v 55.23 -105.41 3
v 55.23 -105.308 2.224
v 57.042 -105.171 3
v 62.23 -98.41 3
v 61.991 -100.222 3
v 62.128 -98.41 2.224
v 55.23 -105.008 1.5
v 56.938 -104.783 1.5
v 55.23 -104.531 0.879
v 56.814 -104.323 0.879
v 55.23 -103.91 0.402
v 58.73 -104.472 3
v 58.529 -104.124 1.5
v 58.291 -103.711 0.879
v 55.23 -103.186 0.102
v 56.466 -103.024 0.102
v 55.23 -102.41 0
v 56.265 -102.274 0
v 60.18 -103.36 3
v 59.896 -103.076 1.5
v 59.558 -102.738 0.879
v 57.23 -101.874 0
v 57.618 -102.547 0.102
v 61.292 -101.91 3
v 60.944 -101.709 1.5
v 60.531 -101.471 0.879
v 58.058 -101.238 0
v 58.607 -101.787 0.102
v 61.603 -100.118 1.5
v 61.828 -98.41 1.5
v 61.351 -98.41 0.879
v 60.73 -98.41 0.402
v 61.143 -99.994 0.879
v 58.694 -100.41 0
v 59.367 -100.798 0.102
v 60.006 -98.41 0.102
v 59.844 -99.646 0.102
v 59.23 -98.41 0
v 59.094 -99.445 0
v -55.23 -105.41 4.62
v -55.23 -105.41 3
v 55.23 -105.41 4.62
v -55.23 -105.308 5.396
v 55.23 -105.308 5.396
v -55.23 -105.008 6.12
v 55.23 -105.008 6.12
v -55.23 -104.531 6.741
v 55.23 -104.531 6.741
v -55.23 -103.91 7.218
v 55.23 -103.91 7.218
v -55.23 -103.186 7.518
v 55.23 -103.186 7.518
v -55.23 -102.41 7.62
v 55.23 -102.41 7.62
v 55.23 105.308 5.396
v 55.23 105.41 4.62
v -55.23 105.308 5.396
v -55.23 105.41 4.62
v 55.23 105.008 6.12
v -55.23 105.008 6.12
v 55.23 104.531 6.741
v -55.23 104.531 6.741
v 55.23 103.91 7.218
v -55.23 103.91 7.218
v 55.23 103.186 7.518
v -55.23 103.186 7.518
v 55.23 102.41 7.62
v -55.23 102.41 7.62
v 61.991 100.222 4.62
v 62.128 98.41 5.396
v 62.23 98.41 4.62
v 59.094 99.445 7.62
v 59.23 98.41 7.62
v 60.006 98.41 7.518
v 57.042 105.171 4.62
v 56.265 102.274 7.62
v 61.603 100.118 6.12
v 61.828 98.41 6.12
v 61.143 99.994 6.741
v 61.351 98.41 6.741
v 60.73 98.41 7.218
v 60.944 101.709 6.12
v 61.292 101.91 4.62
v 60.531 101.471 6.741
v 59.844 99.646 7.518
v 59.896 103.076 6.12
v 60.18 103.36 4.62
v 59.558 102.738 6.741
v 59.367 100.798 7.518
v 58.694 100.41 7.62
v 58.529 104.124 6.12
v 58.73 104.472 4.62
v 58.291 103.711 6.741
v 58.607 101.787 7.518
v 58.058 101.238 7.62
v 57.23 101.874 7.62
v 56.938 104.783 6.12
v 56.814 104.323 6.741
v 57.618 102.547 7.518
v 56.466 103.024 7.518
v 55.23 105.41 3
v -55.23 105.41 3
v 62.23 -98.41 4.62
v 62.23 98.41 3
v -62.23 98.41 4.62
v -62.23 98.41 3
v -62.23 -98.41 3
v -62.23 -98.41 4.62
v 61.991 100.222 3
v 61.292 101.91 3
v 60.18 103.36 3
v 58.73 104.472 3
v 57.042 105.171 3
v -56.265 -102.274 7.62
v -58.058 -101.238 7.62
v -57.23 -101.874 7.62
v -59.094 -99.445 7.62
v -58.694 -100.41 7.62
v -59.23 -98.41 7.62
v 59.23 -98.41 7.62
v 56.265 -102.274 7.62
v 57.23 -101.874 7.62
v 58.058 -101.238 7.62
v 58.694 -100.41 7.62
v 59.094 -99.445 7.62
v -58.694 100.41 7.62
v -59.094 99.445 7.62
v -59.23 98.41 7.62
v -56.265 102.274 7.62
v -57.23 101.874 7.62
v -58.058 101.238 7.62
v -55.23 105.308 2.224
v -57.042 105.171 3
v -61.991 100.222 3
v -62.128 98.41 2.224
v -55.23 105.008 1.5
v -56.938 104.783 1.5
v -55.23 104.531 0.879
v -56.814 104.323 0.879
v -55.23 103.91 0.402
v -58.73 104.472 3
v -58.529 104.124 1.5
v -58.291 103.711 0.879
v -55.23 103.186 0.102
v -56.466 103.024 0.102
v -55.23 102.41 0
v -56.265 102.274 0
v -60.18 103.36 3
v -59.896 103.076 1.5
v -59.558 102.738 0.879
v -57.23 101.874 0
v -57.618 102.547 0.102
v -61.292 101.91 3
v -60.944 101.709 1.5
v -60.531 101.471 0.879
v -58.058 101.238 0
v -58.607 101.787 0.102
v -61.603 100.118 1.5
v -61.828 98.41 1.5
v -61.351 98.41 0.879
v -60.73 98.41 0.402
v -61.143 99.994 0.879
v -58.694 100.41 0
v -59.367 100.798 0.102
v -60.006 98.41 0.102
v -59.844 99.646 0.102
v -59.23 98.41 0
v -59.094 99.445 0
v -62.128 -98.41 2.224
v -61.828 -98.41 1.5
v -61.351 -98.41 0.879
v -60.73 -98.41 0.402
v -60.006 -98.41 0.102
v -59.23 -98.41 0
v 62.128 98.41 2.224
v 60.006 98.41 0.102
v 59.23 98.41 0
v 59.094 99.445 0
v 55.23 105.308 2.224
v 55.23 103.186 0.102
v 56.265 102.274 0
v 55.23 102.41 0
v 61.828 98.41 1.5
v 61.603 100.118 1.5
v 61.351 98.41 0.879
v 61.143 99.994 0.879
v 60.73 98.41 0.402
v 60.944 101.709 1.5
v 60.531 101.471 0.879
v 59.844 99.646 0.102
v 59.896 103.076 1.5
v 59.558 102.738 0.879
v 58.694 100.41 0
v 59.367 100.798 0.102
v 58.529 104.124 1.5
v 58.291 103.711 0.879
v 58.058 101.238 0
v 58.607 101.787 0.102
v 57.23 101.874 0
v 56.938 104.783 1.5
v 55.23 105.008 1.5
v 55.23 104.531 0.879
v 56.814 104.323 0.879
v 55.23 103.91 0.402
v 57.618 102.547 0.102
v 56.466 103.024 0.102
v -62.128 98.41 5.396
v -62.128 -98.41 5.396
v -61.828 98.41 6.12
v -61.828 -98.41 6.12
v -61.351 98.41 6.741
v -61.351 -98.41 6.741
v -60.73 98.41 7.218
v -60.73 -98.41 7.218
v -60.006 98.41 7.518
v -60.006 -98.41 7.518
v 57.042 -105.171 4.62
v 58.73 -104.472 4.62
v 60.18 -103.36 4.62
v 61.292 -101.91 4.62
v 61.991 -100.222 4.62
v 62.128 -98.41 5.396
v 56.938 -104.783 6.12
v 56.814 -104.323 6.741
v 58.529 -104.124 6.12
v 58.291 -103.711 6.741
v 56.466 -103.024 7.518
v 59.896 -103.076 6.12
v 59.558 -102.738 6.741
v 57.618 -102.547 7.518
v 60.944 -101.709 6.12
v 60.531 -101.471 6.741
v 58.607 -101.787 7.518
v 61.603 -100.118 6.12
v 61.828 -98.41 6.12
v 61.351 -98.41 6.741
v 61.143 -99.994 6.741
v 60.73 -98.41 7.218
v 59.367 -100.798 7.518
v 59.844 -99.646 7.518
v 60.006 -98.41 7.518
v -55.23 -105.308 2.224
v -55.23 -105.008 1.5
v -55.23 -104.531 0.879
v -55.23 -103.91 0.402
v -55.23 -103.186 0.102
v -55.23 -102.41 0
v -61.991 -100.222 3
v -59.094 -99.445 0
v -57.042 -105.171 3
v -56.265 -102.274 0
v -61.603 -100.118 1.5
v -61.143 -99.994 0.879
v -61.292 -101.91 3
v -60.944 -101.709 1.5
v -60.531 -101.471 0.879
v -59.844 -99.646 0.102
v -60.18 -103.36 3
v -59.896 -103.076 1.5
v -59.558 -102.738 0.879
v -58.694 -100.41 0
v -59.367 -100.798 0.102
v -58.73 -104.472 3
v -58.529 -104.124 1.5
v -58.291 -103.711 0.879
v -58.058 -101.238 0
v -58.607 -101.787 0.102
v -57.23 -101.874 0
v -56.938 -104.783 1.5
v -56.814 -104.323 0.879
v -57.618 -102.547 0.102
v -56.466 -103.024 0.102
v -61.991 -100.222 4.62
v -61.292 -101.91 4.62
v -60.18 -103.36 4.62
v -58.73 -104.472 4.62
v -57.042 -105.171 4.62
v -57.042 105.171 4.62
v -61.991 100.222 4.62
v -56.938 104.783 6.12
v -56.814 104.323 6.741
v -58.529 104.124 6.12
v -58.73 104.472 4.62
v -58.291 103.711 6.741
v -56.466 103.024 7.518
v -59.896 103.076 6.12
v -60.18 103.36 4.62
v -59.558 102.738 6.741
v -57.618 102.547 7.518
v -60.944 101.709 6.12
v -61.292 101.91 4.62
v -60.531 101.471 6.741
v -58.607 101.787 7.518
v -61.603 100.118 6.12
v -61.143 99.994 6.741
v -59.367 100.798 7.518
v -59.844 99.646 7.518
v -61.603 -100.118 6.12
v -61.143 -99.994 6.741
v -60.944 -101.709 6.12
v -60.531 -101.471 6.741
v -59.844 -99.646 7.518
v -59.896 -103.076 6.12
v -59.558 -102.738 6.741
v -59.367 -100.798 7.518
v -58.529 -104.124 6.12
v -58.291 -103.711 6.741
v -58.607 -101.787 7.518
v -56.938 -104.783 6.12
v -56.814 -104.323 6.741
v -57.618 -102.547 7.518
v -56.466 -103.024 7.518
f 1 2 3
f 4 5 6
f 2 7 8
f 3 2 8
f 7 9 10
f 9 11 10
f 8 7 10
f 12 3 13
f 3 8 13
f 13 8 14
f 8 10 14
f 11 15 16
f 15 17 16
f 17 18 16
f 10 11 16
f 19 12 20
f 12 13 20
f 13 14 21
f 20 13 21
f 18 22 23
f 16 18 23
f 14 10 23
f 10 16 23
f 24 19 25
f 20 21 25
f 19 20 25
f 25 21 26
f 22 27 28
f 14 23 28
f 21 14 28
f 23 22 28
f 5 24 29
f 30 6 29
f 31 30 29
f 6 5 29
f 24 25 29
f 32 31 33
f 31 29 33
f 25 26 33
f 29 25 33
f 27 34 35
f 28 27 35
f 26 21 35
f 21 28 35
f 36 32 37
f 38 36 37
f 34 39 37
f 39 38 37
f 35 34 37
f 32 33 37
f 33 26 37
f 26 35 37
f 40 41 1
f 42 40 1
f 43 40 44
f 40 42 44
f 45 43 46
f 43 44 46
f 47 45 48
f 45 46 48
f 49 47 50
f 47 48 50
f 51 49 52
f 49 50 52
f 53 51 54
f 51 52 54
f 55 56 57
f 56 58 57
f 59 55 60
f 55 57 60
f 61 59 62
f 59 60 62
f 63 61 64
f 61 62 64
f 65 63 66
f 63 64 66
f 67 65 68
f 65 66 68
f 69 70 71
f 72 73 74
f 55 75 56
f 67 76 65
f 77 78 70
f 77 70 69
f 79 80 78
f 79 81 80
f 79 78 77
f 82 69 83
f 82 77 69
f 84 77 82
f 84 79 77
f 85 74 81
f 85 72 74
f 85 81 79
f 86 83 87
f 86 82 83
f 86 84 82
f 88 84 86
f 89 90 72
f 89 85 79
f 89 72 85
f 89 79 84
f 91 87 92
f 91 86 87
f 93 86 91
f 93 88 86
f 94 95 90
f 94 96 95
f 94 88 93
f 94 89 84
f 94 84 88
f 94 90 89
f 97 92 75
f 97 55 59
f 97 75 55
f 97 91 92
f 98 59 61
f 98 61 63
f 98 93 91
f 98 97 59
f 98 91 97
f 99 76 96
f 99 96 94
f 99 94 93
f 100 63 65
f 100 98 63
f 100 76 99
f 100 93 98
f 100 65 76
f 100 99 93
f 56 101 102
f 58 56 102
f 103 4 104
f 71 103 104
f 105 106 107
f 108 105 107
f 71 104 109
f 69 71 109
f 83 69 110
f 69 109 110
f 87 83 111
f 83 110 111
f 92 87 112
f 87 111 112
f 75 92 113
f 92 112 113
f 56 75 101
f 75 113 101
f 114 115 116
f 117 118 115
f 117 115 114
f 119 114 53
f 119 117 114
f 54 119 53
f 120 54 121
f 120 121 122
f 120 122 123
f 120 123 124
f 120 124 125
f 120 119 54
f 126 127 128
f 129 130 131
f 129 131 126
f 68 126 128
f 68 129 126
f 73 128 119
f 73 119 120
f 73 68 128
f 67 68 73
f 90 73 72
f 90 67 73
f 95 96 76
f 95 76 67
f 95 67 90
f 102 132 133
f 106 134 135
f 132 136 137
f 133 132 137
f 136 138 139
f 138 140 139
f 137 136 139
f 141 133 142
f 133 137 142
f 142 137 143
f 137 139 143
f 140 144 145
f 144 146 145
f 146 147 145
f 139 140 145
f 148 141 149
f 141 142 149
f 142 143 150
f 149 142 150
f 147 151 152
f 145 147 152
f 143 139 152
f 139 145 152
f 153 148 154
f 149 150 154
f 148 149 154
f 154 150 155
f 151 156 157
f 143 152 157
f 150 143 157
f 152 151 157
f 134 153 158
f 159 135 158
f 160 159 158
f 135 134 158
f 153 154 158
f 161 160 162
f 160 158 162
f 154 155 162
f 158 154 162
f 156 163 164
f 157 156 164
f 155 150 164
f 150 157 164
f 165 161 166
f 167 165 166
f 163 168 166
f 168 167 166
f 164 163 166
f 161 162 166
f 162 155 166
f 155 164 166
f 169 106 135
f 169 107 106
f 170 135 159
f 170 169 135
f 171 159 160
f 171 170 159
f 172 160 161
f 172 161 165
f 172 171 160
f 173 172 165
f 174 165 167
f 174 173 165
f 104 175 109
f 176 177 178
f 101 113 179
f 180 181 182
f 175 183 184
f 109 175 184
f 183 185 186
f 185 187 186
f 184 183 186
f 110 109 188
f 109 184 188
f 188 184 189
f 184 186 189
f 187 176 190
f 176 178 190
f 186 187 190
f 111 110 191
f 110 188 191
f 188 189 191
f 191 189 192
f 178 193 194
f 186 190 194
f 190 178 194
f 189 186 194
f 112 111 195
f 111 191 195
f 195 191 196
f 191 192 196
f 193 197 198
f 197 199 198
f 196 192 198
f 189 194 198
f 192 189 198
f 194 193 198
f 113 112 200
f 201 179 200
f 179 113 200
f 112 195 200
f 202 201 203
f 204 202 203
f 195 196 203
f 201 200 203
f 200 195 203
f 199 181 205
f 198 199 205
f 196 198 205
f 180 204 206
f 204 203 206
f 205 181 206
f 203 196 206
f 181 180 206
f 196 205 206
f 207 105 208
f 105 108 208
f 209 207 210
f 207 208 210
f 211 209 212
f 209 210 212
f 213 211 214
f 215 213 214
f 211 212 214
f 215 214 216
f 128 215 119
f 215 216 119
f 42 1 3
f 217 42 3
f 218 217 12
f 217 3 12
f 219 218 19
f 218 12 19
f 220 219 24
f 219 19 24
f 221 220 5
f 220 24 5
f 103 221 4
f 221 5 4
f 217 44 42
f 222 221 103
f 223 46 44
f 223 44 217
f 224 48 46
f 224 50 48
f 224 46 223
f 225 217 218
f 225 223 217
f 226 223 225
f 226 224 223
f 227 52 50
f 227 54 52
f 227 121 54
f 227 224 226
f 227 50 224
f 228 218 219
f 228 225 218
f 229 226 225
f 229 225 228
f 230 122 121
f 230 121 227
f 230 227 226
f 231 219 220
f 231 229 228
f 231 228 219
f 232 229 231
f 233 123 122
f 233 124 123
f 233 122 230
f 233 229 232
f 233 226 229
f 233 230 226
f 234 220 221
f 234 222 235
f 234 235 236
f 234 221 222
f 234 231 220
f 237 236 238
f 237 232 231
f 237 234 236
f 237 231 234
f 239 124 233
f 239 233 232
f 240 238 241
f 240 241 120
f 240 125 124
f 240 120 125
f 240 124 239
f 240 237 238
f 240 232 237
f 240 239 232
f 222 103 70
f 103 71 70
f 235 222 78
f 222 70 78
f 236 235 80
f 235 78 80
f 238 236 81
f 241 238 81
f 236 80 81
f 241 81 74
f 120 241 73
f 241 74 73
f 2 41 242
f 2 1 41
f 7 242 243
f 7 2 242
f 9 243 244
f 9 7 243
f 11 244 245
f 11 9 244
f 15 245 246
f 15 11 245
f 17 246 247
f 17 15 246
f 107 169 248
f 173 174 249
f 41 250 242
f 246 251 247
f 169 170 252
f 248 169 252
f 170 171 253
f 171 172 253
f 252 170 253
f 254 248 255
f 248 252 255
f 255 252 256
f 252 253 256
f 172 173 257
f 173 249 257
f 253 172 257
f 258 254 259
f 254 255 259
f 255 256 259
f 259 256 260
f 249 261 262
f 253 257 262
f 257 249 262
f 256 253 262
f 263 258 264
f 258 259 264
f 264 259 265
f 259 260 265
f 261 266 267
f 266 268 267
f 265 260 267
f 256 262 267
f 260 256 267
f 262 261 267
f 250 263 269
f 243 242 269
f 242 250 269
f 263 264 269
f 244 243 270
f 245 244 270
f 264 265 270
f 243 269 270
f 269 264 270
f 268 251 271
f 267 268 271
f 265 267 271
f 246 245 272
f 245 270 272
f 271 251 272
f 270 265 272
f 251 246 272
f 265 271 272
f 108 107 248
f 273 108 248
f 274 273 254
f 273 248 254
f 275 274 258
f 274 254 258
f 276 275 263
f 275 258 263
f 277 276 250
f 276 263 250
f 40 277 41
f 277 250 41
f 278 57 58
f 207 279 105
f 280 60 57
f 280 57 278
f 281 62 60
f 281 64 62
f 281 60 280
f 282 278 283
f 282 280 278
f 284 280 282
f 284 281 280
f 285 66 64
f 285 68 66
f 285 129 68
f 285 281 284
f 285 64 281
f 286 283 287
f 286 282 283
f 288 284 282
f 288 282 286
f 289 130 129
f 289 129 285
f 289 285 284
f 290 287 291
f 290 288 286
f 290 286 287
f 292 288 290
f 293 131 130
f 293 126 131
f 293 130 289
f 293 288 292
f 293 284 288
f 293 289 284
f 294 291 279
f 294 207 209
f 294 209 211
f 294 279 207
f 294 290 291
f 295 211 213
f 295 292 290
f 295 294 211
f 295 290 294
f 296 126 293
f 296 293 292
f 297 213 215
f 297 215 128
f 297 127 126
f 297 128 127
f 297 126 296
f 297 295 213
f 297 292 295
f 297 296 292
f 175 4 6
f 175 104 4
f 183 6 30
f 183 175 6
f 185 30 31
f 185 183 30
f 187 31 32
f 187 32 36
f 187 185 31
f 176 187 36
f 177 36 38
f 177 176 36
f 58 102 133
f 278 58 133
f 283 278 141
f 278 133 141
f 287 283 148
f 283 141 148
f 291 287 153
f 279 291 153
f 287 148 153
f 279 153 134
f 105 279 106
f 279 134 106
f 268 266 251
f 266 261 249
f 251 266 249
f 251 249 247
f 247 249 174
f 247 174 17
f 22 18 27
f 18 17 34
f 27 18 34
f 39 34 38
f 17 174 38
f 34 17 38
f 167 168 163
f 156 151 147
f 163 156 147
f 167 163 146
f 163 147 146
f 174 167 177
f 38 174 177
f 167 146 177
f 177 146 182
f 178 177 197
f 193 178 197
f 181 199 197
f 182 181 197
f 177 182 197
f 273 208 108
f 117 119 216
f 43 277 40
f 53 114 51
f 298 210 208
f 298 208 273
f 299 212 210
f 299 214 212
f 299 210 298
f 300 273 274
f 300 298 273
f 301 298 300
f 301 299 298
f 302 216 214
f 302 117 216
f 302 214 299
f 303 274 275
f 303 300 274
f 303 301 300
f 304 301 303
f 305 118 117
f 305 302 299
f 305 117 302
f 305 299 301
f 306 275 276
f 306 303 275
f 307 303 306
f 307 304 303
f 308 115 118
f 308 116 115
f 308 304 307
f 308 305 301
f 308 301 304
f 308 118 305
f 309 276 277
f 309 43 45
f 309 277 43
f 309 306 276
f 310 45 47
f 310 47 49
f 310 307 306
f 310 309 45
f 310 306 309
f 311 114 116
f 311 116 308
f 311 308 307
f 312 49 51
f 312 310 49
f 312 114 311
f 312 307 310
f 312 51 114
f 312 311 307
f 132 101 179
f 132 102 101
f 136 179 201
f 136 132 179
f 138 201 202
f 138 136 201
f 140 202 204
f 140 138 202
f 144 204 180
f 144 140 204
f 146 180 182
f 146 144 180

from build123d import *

# Parameters (mm, degrees)
F1_DEPTH = 7.62
F2_R     = 3
F3_R     = 3


with BuildPart() as f1:
    # F0 (on Top) → F1 (new body)
    with BuildSketch(Plane.XY):
        with BuildLine():
            ThreePointArc((-62.23, -98.41), (-60.179747, -103.359747), (-55.23, -105.41))
            Line((-55.23, -105.41), (55.23, -105.41))
            ThreePointArc((55.23, -105.41), (60.179747, -103.359747), (62.23, -98.41))
            Line((62.23, -98.41), (62.23, 98.41))
            ThreePointArc((62.23, 98.41), (60.179747, 103.359747), (55.23, 105.41))
            Line((55.23, 105.41), (-55.23, 105.41))
            ThreePointArc((-55.23, 105.41), (-60.179747, 103.359747), (-62.23, 98.41))
            Line((-62.23, 98.41), (-62.23, -98.41))
        make_face()
    extrude(amount=F1_DEPTH)

    # F2
    f2_edges = [f1.edges().sort_by_distance(p)[0] for p in [
        (-62.23, 0, 7.62),
    ]]
    fillet(f2_edges, radius=F2_R)

    # F3
    f3_edges = [f1.edges().sort_by_distance(p)[0] for p in [
        (-60.179747, -103.359747, 0),
        (0, -105.41, 0),
        (60.179747, -103.359747, 0),
        (62.23, 0, 0),
        (60.179747, 103.359747, 0),
        (0, 105.41, 0),
        (-60.179747, 103.359747, 0),
        (-62.23, 0, 0),
    ]]
    fillet(f3_edges, radius=F3_R)


solid = f1.part
